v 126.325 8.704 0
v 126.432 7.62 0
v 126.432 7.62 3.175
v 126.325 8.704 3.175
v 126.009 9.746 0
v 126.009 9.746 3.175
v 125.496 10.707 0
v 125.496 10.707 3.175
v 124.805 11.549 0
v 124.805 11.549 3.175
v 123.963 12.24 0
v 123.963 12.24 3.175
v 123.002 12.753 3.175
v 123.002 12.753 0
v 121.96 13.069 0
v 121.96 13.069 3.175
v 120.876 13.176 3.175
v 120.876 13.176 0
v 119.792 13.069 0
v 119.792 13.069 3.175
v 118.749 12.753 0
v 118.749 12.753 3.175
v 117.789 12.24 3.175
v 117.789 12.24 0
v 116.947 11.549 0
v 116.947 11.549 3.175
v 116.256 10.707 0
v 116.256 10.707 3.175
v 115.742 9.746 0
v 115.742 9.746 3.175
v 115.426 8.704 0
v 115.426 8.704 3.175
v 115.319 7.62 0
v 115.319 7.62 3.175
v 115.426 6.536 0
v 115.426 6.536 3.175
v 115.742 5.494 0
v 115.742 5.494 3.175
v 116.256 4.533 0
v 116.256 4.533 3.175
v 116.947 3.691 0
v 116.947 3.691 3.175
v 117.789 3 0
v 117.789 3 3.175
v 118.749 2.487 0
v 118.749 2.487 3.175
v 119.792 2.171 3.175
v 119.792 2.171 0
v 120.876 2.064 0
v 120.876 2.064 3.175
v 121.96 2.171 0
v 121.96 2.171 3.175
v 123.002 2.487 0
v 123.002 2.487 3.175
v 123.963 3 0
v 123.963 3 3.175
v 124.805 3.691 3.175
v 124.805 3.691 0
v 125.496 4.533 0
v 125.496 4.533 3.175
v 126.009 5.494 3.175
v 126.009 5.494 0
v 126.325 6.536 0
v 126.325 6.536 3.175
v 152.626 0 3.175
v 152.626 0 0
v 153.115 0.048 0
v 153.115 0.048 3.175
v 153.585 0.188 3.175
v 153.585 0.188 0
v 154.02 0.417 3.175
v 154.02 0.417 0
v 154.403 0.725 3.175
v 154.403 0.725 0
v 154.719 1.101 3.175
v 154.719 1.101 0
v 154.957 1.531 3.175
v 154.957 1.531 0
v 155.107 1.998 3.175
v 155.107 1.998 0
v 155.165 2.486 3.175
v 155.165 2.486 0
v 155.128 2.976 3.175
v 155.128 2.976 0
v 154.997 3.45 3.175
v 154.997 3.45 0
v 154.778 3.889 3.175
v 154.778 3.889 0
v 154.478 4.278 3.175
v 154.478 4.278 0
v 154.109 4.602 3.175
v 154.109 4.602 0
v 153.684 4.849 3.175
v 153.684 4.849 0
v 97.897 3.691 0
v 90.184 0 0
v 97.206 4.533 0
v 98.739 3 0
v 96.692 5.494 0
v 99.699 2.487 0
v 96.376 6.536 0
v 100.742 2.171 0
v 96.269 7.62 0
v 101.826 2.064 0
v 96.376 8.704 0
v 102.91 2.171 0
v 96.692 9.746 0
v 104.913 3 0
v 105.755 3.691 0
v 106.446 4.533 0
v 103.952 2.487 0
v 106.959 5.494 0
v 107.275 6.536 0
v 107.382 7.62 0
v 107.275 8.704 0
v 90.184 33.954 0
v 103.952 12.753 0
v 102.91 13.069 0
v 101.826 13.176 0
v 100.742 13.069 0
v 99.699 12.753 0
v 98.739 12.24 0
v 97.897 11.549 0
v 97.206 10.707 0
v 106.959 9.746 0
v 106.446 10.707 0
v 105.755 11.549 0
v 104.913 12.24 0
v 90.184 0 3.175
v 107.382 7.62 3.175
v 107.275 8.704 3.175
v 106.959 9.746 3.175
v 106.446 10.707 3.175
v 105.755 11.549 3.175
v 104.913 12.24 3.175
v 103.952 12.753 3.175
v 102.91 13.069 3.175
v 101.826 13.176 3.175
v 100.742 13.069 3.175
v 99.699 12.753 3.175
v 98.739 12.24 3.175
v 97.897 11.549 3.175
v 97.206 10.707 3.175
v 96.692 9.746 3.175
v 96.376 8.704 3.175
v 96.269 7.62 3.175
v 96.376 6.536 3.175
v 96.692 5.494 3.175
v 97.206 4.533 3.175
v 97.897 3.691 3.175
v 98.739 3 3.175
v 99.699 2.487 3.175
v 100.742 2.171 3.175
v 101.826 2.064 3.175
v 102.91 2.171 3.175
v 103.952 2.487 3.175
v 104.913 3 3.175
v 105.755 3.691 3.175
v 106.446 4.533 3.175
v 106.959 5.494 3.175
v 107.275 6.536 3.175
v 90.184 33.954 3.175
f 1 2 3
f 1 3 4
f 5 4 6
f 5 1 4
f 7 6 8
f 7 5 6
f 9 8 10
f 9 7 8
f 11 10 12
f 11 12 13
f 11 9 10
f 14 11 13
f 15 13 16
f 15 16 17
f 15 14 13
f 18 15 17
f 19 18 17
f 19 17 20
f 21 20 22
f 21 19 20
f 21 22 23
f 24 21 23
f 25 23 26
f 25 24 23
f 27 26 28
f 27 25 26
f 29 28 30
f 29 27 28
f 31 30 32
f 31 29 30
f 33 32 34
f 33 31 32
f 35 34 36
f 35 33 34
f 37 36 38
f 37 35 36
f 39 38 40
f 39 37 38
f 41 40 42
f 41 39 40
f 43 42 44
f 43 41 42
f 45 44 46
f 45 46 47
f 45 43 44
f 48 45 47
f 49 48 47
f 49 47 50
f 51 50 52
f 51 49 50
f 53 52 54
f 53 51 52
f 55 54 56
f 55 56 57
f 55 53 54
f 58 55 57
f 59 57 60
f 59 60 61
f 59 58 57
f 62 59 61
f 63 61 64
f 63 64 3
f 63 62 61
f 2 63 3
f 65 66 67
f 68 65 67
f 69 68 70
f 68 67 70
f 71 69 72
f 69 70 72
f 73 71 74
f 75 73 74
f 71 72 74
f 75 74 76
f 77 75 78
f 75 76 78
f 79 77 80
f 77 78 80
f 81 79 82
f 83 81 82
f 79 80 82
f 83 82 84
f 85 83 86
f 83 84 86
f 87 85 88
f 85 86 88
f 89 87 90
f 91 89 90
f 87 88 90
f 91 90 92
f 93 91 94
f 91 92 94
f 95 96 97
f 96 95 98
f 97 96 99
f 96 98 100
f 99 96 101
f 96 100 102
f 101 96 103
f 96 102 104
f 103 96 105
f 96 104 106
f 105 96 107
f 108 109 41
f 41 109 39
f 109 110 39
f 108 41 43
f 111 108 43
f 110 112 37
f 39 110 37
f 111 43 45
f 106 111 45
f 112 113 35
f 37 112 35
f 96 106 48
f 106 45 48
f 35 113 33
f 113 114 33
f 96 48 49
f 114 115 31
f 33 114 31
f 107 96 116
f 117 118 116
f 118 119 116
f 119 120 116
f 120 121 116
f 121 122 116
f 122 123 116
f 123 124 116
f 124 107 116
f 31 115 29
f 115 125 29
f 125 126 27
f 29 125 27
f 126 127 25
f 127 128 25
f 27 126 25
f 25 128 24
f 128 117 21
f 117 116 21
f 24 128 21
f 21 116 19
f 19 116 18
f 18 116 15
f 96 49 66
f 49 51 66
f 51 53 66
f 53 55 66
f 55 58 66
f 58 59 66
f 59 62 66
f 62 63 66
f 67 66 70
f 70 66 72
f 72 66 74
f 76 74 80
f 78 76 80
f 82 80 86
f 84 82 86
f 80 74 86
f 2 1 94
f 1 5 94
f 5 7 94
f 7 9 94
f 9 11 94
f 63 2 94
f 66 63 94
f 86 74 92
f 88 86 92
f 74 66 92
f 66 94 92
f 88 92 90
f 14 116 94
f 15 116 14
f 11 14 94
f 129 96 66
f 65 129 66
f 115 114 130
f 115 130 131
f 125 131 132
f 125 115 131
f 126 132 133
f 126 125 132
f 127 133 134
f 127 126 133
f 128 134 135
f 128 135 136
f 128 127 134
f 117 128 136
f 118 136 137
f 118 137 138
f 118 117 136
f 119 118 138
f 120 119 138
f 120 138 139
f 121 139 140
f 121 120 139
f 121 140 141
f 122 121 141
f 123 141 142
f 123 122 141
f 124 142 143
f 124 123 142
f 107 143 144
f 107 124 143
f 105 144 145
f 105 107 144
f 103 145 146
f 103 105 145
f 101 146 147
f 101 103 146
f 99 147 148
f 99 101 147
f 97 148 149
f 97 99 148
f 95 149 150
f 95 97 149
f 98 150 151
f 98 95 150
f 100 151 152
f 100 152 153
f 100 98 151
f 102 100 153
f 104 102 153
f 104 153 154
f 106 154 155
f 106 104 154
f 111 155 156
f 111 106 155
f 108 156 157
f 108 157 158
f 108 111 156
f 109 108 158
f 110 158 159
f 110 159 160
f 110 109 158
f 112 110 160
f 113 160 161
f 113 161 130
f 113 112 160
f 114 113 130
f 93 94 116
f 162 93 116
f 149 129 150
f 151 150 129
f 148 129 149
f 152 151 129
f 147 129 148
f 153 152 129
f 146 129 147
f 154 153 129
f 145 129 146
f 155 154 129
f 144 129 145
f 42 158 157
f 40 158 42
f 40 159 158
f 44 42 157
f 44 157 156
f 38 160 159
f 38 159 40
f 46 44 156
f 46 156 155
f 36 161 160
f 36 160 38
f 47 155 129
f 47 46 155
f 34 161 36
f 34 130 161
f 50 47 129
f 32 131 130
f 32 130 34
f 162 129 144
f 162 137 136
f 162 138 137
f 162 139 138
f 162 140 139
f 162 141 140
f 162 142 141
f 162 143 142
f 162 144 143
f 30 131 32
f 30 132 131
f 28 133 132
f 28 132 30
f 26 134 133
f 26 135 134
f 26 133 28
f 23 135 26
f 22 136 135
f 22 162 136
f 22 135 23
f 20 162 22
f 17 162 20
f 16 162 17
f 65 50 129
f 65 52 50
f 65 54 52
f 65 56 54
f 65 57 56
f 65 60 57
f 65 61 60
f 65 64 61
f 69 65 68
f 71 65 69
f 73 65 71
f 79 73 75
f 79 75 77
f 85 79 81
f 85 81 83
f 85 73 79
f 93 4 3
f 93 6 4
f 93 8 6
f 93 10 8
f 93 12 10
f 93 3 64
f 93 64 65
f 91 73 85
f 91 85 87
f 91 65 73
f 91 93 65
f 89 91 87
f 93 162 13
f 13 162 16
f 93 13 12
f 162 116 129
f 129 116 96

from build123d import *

# Parameters (mm, degrees)
SKETCH1_R      = 5.55625
EXTRUDE1_DEPTH = 3.175


with BuildPart() as part:
    # Sketch1 → Extrude1 (new body)
    with BuildSketch(Plane.XY):
        with BuildLine():
            Line((90.184030844, 0), (152.625697511, 0))
            ThreePointArc((152.625697511, 0), (155.107278383, 1.998376171), (153.684030844, 4.849010731))
            Line((153.684030844, 4.849010731), (90.184030844, 33.954188012))
            Line((90.184030844, 33.954188012), (90.184030844, 0))
        make_face()
        with Locations((120.875697511, 7.62)):
            Circle(SKETCH1_R, mode=Mode.SUBTRACT)
        with Locations((101.825697511, 7.62)):
            Circle(SKETCH1_R, mode=Mode.SUBTRACT)
    extrude(amount=EXTRUDE1_DEPTH)


solid = part.part
